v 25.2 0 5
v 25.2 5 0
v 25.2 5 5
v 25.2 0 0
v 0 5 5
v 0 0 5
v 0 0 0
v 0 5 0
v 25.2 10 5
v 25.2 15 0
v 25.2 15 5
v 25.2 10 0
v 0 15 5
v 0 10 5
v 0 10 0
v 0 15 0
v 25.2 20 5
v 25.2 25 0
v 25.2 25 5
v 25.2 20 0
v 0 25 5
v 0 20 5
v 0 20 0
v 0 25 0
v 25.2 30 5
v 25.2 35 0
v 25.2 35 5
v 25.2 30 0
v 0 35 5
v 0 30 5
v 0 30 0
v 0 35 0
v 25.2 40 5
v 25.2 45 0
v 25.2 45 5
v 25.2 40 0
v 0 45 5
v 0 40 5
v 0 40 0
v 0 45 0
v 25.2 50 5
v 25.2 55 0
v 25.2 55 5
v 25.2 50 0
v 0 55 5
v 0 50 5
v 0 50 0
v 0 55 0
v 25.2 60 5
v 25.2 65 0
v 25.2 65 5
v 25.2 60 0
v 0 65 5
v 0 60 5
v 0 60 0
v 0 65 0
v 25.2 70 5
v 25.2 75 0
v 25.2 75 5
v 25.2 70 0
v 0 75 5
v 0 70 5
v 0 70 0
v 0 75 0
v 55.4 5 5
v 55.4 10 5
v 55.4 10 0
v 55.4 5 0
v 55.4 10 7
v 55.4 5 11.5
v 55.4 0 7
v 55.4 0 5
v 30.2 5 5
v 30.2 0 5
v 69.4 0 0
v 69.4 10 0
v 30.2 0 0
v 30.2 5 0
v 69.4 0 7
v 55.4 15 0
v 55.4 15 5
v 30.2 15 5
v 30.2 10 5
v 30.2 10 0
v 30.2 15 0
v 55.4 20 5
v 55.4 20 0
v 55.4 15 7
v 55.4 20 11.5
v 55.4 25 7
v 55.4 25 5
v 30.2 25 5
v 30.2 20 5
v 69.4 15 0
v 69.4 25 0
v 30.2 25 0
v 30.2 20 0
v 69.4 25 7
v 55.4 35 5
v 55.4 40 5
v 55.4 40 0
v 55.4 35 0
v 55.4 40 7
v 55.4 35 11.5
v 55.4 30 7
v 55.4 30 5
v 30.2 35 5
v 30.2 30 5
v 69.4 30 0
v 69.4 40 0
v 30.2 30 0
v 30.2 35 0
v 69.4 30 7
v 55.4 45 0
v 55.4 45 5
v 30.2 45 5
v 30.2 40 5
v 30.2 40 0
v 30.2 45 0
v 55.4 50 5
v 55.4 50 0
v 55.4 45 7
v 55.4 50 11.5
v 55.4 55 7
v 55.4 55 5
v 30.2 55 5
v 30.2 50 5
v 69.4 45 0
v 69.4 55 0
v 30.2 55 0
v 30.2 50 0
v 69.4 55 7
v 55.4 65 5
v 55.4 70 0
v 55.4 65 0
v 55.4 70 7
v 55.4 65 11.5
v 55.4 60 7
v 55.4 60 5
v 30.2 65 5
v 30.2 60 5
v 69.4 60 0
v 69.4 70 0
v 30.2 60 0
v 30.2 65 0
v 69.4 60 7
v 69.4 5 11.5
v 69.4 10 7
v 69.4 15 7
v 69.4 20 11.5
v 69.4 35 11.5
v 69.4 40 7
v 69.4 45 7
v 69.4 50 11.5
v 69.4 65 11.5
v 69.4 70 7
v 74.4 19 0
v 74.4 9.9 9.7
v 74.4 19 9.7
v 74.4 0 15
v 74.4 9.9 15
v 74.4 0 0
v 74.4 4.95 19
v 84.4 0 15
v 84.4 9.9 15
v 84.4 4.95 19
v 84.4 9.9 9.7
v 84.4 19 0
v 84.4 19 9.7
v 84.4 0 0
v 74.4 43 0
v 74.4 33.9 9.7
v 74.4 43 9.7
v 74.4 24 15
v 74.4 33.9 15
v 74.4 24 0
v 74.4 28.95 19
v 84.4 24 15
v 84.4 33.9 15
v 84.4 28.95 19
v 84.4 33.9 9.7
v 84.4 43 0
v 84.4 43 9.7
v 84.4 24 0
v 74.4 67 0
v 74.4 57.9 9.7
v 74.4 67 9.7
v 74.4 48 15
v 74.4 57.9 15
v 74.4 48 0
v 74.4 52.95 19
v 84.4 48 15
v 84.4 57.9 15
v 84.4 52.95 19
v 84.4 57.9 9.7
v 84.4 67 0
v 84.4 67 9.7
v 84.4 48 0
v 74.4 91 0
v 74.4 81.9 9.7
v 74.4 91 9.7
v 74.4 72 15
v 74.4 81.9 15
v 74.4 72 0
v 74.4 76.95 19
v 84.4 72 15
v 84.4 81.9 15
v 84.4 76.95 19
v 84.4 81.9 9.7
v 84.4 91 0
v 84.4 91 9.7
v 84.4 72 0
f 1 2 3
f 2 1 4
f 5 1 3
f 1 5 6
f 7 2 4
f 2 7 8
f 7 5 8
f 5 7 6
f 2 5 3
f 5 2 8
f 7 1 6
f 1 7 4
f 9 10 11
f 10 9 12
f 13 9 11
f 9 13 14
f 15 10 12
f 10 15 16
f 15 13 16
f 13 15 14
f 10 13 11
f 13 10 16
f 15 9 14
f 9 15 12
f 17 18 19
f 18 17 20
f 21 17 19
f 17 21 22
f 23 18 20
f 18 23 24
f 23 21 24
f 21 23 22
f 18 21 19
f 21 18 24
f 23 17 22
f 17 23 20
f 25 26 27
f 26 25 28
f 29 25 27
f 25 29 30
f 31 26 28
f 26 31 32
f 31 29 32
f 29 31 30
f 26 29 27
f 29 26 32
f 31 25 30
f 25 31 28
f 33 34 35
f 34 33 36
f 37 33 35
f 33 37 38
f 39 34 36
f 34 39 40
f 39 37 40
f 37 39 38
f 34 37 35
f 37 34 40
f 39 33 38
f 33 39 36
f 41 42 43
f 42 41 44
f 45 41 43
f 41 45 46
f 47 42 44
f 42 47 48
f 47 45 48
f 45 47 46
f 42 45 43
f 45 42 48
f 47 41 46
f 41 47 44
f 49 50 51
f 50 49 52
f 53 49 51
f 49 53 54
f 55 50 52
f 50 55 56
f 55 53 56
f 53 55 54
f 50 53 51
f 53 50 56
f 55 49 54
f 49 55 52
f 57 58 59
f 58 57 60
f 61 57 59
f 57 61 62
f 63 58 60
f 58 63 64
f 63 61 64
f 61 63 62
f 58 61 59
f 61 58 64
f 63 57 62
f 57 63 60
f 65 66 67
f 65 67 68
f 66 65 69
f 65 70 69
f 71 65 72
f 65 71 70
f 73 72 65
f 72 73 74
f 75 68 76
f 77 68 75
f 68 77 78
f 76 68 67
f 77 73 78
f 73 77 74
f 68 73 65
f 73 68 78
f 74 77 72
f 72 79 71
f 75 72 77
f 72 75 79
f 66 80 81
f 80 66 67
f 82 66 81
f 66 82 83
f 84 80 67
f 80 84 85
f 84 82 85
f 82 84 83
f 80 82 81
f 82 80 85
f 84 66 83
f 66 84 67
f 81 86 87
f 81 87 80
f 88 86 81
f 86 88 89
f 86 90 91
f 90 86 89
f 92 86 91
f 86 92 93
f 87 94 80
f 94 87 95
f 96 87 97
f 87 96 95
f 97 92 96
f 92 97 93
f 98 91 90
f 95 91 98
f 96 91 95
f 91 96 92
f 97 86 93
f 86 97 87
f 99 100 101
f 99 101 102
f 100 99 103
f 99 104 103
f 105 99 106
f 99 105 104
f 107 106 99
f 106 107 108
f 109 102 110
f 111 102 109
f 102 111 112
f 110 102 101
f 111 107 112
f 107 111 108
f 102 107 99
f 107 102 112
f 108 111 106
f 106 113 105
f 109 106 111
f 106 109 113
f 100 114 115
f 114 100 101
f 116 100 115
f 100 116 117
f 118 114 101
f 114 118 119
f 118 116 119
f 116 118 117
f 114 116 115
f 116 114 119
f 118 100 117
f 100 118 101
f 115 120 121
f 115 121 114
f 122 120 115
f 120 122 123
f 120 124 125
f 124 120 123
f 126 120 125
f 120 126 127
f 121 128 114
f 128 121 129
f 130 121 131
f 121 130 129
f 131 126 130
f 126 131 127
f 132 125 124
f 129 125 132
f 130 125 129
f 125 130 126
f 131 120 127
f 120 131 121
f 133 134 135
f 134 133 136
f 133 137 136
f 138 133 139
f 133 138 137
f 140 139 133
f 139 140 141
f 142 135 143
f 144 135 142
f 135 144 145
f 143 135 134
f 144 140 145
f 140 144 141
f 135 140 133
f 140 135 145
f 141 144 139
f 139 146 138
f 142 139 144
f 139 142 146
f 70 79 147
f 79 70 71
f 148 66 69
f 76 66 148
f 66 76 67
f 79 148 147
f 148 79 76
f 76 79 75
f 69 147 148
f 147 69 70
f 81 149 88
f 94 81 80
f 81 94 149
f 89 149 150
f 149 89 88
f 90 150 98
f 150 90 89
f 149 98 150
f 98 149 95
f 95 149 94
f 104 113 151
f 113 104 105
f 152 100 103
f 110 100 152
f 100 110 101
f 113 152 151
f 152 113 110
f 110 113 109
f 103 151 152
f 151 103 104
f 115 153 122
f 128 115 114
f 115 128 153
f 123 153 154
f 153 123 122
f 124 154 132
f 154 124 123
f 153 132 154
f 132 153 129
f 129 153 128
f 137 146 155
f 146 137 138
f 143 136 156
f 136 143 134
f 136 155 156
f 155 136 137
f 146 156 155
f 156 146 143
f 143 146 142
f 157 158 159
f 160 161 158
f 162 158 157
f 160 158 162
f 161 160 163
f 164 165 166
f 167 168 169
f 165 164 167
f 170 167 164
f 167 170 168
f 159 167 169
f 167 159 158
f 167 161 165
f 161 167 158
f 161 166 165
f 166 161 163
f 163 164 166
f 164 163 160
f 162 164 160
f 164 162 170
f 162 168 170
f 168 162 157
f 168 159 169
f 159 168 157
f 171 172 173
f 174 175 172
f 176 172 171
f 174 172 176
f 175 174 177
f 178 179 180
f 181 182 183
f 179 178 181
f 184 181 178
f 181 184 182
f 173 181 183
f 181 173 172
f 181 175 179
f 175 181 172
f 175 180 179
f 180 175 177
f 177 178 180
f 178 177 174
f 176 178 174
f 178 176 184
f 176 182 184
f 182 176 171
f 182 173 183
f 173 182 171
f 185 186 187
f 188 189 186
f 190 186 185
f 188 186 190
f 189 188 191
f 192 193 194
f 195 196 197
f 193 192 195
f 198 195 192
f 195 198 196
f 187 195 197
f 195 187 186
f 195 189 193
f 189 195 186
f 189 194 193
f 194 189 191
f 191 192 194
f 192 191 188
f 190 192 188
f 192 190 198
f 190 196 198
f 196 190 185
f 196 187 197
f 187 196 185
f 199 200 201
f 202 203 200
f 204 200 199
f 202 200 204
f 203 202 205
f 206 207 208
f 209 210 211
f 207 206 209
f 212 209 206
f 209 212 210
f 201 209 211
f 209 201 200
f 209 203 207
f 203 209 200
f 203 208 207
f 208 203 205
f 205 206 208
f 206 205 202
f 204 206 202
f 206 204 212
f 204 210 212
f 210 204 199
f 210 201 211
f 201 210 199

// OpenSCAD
//!OpenSCAD
//Replacement pieces for Settlers of Catan
//By John Stäck

//Licensed under Creative Commons Attribution-ShareAlike
//http://creativecommons.org/licenses/by-sa/3.0/

// ROAD
road_length = 25.2;
road_width = 5.0;

module road()
{
	cube([road_length, road_width, road_width]);
}


// HOUSE
house_width = 10.0;
house_height = 11.5;
house_roof = 7.0; //Where roof starts
house_length = 14.0;
house_pt = [	[0,0],
			[house_width,0],
			[house_width,house_roof],
			[house_width/2, house_height],
			[0, house_roof]
           ];
house_ps = [[0,1,2,3,4]];

module house()
{
	rotate([90,0,90]) linear_extrude(height=house_length, convexity=2) polygon(points=house_pt, paths=house_ps);
}

// CITY
city_width = 19.0;
city_tower_width = 9.9; //Width of the tower part
city_height = 9.7;
city_tower_height = 19.0;
city_roof = 15.0; //Where roof starts on tower part
city_length = 10.0;

city_pt = [	[0,0],
			[city_width,0],
			[city_width,city_height],
			[city_tower_width,city_height],
			[city_tower_width,city_roof],
			[city_tower_width/2,city_tower_height],
			[0,city_roof]
		 ];

city_ps = [[0,1,2,3,4,5,6]];
module city()
{
	rotate([90,0,90]) linear_extrude(height=city_length, convexity=2) polygon(points=city_pt, paths=city_ps);
}


//Make a whole kit!!
n_road1 = 8;
n_road2 = 7;
n_houses = 5;
n_cities = 4;
space=road_width;
for(i=[0:n_road1-1]) translate([0, (road_width+space)*i, 0]) road();
for(i=[0:n_road2-1]) translate([road_length+space,,(road_width+space)*i, 0]) road();
for(i=[0:n_houses-1]) translate([road_length+road_length+space,(house_width+space)*i,0]) house();
for(i=[0:n_cities-1]) translate([road_length+road_length+house_length+space*2,(city_width+space)*i, 0]) city();
